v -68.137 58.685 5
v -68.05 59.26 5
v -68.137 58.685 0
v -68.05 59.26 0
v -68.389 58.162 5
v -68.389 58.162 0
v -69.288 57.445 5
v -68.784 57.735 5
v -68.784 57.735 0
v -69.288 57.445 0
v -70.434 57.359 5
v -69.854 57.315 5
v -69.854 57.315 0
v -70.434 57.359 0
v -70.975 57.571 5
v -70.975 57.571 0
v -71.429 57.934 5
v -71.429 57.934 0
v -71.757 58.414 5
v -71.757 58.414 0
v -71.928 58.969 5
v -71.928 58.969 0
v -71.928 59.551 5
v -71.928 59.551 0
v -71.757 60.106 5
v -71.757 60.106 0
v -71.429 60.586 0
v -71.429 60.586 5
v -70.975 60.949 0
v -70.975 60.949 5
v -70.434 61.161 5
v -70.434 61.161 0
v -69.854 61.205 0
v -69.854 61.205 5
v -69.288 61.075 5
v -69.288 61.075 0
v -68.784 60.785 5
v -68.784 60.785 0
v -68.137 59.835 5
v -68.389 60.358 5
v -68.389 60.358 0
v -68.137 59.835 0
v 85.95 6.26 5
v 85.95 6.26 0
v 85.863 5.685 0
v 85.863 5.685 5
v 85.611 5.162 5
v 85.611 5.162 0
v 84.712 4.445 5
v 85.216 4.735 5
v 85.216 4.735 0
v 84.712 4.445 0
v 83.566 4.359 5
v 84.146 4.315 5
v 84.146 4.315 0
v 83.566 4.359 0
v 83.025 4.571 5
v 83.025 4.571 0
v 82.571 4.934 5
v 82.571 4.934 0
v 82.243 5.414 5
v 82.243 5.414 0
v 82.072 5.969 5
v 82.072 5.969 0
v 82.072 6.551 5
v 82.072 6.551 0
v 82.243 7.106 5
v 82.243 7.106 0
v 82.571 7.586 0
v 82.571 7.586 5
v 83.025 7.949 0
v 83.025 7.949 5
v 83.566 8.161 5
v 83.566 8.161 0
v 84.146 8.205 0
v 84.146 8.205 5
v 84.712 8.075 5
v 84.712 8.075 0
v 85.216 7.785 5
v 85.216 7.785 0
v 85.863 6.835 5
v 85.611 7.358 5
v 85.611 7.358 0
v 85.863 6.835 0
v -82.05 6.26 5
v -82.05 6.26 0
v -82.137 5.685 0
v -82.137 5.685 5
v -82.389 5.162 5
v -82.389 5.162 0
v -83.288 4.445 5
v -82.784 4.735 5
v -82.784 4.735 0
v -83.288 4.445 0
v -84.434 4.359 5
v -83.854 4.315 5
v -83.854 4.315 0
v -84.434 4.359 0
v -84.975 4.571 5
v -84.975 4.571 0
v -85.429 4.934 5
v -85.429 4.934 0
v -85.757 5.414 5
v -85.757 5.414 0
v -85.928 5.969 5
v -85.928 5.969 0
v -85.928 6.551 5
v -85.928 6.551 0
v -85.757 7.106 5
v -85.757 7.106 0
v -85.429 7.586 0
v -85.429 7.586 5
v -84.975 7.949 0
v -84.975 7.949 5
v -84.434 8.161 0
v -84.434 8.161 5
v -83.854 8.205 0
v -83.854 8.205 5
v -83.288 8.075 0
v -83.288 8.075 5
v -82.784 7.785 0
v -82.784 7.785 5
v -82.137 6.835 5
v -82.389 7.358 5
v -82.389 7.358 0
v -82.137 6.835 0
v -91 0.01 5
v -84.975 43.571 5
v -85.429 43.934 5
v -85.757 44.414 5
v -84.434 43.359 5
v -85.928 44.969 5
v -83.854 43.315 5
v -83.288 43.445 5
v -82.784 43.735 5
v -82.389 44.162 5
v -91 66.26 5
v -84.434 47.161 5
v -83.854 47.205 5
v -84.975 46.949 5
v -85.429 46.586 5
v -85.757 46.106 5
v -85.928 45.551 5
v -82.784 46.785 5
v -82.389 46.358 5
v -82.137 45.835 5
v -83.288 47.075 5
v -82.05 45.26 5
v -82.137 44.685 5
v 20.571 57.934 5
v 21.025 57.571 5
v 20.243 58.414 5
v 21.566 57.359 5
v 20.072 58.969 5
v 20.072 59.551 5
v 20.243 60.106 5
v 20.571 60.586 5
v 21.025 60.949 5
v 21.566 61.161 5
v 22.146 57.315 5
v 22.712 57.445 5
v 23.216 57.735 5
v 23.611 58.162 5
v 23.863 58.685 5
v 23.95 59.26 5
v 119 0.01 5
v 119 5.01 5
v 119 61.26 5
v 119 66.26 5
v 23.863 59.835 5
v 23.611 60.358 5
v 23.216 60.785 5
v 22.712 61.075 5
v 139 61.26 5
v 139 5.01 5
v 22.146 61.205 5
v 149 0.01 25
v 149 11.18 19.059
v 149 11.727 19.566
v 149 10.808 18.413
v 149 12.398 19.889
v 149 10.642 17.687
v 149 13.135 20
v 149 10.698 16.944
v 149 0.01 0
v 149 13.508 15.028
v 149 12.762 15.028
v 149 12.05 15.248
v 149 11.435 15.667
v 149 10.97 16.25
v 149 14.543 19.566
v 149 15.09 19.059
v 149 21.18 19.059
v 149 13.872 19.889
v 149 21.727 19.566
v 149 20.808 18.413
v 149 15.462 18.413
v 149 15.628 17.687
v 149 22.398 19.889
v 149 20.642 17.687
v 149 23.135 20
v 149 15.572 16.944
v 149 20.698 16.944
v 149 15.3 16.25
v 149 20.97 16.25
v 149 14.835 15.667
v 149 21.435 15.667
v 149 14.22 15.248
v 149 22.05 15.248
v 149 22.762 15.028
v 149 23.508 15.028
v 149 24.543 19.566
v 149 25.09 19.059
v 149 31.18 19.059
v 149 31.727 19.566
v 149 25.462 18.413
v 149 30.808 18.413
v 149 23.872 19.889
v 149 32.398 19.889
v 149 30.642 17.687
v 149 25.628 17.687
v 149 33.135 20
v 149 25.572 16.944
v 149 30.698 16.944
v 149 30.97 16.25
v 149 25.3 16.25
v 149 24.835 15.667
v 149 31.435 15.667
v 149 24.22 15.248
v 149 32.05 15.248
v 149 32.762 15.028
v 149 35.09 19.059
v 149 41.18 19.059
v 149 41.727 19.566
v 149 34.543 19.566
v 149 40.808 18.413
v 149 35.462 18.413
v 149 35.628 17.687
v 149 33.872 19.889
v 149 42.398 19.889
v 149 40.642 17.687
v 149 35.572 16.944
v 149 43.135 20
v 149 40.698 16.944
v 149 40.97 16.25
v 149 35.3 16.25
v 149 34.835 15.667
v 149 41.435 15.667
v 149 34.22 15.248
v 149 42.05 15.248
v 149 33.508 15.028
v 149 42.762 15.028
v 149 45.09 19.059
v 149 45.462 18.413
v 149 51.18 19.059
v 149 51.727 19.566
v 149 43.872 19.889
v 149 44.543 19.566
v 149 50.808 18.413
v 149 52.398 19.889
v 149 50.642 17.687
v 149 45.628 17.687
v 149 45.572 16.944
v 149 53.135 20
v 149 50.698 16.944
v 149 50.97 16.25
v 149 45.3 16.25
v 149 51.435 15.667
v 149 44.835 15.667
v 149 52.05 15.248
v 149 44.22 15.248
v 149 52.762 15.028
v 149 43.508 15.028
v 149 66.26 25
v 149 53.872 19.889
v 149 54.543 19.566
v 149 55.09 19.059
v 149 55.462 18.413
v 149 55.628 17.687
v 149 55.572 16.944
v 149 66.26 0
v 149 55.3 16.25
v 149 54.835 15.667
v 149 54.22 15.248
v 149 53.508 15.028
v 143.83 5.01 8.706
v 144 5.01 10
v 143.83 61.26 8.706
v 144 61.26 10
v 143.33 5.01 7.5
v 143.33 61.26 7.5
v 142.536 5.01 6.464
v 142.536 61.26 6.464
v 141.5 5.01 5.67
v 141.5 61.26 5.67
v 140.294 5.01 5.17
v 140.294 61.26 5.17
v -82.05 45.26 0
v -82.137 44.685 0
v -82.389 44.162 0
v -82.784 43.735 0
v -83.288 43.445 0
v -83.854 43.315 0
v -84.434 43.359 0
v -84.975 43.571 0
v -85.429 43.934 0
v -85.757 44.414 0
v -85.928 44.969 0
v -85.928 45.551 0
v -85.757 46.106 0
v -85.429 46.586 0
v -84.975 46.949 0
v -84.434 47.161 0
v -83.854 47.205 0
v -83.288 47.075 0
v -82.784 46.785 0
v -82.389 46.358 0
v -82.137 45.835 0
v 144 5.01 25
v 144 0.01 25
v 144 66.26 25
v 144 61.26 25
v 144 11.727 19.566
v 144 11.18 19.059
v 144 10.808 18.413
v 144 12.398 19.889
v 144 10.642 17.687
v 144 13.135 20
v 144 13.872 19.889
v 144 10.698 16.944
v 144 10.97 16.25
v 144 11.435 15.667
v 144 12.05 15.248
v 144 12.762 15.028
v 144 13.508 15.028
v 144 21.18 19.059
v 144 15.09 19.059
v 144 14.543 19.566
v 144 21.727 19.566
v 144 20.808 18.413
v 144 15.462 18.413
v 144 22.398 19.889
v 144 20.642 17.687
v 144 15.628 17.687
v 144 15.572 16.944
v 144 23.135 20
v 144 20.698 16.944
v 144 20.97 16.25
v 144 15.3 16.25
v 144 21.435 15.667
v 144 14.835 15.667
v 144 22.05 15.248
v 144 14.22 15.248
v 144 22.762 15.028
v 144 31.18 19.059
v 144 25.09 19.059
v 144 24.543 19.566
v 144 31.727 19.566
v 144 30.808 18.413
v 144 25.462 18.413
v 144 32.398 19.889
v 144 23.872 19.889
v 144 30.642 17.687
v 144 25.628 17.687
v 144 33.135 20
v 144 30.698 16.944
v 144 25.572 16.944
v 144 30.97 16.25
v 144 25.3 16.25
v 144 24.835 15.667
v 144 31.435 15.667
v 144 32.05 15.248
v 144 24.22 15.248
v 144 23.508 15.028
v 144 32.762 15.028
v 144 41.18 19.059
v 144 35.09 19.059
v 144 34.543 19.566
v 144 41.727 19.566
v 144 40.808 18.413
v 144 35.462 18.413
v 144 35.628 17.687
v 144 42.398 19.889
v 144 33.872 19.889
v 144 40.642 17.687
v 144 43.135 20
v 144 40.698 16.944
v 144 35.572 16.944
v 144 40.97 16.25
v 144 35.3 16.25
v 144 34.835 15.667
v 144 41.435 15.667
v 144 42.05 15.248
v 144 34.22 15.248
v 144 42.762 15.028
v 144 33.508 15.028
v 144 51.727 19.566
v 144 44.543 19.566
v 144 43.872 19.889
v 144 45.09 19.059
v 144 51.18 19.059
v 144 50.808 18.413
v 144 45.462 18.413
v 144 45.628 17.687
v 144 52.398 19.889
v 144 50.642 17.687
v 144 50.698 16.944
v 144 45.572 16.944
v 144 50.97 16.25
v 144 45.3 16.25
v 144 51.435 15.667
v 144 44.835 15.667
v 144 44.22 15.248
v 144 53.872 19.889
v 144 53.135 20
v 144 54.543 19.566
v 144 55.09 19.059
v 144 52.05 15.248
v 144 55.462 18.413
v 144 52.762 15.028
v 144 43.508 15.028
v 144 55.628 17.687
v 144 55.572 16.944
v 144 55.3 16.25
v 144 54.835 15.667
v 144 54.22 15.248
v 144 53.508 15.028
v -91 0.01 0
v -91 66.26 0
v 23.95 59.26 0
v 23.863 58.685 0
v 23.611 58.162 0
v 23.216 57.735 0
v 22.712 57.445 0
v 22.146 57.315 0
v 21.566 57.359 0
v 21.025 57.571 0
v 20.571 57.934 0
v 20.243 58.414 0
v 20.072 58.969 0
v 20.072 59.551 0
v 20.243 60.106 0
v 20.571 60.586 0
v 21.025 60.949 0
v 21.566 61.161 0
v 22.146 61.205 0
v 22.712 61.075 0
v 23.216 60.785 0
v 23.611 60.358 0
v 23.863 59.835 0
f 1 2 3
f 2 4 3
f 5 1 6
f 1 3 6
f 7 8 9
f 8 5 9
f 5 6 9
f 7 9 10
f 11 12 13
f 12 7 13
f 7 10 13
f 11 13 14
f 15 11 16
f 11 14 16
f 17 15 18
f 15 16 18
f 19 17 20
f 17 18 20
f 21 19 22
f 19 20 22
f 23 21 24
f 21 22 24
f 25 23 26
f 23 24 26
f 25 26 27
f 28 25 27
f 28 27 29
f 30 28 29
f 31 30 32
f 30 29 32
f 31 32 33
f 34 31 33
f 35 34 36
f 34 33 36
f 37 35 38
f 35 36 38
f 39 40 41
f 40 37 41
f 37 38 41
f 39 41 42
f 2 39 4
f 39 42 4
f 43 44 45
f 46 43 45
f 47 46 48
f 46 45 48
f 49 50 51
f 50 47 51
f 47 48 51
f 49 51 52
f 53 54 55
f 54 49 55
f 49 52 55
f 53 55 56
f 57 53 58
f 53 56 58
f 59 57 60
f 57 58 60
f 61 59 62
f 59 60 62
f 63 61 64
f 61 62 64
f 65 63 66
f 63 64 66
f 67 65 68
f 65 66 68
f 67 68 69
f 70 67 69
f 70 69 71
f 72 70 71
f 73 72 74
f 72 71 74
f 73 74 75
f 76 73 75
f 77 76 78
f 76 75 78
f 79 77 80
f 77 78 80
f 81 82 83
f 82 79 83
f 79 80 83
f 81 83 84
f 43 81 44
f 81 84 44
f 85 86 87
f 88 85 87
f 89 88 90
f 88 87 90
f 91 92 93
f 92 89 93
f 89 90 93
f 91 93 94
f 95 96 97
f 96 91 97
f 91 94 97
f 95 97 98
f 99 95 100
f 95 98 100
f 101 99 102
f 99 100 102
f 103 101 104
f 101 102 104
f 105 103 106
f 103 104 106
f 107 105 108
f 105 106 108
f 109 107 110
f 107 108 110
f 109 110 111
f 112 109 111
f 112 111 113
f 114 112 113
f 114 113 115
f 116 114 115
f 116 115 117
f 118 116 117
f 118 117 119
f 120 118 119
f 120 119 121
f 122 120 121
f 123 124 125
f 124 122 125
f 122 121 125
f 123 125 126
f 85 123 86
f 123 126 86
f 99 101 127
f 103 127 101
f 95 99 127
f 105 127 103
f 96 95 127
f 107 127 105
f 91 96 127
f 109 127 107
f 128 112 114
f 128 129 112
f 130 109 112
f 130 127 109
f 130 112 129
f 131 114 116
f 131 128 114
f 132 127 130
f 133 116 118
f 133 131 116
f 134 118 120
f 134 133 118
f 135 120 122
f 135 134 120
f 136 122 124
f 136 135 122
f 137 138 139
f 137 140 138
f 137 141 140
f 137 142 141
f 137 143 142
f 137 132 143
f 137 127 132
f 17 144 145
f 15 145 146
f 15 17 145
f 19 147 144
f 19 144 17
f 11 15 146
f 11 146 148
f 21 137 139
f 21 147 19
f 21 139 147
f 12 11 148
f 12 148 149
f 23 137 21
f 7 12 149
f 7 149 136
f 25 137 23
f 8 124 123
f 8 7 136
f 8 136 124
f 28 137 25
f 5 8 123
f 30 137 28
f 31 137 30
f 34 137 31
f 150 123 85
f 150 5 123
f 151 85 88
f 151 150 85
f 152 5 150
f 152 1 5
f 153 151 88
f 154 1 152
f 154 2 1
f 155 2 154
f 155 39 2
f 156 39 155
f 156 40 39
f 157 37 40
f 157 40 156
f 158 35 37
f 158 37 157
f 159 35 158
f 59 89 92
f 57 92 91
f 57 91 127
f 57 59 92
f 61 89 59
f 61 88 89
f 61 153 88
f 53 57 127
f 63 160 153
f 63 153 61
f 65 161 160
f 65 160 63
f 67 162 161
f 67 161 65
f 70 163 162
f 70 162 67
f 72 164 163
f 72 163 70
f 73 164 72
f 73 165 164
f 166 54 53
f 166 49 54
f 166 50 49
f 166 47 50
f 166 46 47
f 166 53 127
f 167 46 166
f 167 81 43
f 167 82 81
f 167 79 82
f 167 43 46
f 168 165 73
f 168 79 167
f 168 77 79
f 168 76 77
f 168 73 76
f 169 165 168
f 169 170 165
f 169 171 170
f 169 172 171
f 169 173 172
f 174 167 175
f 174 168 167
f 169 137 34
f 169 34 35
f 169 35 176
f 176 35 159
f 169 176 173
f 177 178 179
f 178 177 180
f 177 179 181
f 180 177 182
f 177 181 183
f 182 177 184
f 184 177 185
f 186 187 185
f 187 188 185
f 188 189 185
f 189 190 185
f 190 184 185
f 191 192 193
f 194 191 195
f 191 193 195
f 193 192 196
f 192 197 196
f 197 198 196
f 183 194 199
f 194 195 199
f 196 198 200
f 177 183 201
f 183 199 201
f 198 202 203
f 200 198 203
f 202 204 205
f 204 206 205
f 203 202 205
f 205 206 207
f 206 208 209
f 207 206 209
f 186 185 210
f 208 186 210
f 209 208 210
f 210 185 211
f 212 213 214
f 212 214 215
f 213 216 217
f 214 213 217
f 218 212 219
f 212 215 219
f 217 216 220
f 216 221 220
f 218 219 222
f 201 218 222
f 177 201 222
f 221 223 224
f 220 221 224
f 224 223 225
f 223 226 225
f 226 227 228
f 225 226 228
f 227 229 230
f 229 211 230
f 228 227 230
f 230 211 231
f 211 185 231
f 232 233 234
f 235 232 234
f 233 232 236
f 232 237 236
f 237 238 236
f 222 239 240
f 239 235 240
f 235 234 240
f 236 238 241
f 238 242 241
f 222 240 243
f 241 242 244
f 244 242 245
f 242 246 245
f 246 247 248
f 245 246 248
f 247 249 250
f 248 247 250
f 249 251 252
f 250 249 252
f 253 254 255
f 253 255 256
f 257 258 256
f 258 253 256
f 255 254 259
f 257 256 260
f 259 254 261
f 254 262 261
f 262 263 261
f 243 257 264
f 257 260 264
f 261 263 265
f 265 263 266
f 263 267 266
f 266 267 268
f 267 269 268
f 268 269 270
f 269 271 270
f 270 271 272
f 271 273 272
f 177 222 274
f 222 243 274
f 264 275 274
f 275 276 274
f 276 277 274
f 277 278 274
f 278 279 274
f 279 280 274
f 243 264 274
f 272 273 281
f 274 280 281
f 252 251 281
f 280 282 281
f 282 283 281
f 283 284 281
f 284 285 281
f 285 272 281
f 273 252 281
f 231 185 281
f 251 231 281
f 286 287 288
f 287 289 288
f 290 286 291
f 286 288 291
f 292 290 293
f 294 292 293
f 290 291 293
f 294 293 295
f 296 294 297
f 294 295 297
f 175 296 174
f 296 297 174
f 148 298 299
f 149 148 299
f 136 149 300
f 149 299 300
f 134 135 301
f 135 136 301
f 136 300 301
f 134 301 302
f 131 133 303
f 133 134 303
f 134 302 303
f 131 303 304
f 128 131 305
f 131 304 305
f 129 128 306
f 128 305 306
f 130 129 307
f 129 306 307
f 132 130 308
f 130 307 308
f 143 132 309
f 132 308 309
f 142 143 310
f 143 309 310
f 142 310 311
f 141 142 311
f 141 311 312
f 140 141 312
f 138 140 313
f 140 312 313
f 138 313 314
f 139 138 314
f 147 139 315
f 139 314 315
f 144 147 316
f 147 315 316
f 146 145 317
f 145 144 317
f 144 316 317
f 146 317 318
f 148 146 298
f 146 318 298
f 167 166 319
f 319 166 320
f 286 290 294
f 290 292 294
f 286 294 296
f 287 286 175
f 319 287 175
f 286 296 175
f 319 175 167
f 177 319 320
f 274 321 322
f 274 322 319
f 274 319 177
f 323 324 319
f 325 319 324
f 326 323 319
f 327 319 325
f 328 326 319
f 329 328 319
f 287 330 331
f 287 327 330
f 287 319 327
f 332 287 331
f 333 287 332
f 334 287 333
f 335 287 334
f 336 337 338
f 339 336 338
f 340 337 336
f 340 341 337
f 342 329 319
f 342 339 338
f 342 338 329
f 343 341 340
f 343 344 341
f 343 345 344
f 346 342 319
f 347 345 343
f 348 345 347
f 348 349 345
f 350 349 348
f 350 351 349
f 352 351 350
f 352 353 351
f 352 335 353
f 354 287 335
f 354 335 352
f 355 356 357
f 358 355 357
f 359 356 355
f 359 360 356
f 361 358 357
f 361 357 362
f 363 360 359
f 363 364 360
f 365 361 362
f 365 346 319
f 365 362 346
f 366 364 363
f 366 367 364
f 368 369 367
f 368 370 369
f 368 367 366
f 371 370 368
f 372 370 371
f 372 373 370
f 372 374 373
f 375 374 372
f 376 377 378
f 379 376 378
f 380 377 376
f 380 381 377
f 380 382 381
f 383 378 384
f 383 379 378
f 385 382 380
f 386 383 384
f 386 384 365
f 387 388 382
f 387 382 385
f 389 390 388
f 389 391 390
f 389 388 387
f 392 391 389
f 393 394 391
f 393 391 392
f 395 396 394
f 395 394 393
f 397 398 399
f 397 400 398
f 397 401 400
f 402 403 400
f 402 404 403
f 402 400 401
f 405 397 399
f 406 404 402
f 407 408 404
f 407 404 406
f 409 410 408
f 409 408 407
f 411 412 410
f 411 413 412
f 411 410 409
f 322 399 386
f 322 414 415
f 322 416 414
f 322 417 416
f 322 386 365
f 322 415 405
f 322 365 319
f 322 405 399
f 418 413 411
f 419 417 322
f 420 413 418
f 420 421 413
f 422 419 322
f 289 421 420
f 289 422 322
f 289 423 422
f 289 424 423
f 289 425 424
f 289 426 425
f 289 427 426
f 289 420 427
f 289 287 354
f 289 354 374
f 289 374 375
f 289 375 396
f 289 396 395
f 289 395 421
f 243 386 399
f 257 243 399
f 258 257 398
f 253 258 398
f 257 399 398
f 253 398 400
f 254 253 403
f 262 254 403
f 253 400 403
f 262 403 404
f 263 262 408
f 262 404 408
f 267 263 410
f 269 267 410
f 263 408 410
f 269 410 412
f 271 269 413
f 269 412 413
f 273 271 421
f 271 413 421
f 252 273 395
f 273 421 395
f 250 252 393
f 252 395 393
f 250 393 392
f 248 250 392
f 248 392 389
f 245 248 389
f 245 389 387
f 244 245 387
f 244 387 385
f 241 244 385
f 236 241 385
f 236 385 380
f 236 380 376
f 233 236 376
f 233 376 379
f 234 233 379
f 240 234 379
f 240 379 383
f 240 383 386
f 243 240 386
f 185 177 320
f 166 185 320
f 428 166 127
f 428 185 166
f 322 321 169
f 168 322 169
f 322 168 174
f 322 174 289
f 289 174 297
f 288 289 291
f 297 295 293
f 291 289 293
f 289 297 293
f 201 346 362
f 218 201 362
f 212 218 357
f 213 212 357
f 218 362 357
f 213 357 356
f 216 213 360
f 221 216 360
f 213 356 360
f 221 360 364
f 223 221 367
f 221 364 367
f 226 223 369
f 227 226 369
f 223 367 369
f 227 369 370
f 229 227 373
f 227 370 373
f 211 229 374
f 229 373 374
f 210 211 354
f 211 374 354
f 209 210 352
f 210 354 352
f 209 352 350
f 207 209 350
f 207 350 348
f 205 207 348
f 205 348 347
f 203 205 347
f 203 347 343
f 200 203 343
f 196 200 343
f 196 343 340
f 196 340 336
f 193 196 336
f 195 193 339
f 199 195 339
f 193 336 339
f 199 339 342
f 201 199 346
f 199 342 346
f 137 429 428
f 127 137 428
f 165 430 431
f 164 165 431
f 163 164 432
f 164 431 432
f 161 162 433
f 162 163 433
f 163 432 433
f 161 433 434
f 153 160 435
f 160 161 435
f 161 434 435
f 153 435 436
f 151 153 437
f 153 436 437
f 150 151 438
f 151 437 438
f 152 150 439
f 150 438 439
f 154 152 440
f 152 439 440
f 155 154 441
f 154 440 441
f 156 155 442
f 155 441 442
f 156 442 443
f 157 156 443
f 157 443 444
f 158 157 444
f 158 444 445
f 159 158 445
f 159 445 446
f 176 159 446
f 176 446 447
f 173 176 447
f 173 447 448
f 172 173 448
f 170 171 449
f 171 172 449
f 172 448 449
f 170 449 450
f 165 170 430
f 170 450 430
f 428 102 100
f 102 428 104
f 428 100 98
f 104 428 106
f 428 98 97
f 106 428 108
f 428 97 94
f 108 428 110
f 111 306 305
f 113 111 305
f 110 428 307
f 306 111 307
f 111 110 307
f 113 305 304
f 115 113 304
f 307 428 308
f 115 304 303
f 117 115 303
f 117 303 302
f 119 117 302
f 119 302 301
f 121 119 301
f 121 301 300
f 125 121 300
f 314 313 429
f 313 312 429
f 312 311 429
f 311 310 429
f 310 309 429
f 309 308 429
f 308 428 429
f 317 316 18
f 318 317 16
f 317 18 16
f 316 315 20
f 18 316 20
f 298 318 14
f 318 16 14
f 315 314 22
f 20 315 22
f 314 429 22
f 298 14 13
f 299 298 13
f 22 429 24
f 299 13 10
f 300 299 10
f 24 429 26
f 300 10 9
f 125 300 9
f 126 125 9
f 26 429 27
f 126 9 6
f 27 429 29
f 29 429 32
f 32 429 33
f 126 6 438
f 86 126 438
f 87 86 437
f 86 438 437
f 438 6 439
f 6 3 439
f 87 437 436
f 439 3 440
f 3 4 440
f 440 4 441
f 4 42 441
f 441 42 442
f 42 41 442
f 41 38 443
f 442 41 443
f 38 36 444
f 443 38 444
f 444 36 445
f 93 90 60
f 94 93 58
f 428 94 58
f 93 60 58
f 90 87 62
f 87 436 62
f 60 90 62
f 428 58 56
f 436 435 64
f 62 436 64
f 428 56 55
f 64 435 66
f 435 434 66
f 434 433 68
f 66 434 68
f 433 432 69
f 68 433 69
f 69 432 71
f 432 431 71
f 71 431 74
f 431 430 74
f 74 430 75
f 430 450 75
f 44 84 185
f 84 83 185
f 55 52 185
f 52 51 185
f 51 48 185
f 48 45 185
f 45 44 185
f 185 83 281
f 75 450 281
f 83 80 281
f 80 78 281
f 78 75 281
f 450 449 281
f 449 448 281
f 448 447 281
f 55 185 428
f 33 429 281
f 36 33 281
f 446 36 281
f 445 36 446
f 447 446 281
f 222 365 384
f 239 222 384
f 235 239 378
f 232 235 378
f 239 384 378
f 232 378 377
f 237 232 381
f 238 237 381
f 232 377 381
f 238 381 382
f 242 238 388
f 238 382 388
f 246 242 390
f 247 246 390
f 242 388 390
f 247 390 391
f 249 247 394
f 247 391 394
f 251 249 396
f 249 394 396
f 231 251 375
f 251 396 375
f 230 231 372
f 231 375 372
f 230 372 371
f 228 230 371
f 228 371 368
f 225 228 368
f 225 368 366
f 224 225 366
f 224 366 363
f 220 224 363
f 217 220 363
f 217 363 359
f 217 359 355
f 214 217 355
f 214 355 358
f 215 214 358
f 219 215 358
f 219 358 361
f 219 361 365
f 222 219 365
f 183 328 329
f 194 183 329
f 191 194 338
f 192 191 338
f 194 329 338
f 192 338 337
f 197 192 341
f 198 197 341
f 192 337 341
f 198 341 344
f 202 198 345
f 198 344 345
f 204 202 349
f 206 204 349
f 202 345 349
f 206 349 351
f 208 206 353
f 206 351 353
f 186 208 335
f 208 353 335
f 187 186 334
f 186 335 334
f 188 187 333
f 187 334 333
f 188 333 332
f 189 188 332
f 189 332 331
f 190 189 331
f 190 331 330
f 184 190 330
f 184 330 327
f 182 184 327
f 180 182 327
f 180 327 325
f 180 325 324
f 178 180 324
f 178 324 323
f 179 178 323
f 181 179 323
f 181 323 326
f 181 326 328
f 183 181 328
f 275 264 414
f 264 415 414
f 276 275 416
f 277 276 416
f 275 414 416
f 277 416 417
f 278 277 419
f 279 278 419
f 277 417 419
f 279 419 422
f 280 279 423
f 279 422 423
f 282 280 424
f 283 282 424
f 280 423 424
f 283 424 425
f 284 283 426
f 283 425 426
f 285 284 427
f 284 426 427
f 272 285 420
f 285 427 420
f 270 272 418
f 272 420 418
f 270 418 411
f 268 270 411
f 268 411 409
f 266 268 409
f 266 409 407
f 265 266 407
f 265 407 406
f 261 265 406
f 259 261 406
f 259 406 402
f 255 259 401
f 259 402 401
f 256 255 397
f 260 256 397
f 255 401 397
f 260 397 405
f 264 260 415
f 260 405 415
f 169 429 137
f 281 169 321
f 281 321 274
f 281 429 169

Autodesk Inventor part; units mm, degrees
ref_plane "YZ Plane" through (0, 0, 0) normal (1, 0, 0) x (0, 1, 0)
ref_plane "XZ Plane" through (0, 0, 0) normal (0, 1, 0) x (-1, 0, 0)
ref_plane "XY Plane" through (0, 0, 0) normal (0, 0, 1) x (1, 0, 0)
ref_plane "Work Plane1" through (0, 0, 0) normal (0, 0, 1) x (1, 0, 0)
sketch "Sketch1" plane through (0, 0, 0) normal (0, 0, 1) x (1, 0, 0)
  line L0 (91, 0.01) -> (-91, 0.01) construction
  line L1 (91, 0.01) -> (91, 13.01) construction
  line L2 (28.25, 66.26) -> (91, 13.01) construction
  line L3 (-75.75, 66.26) -> (28.25, 66.26) construction
  line L4 (-91, 51.01) -> (-75.75, 66.26) construction
  line L5 (-91, 0.01) -> (-91, 51.01) construction
  circle A0 centre (22, 59.26) radius 1.95 projected
  circle A1 centre (-84, 6.26) radius 1.95 projected
  circle A2 centre (-84, 45.26) radius 1.95 projected
  circle A3 centre (-70, 59.26) radius 1.95 projected
  line L6 (149.1, -0.3275) -> (149.1, 180.6725) construction
  line L7 (-91, 0.01) -> (149, 0.01)
  line L8 (149, 0.01) -> (149, 66.26)
  line L9 (149, 66.26) -> (-91, 66.26)
  line L10 (-91, 66.26) -> (-91, 0.01)
  circle A4 centre (84, 6.26) radius 1.95 projected
  point P0 (0, 0)
  dimension "d0" = 0.1
extrude "Extrusion1" add sketch "Sketch1" along normal blind 5
sketch "Sketch2" plane through (0, 0, 5) normal (0, 0, 1) x (1, 0, 0)
  line L0 (149, 0.01) -> (149, 66.26) projected
  line L1 (149, 66.26) -> (-91, 66.26) projected
  line L2 (149, 0.01) -> (144, 0.01)
  line L3 (144, 0.01) -> (144, 66.26)
  line L4 (144, 66.26) -> (149, 66.26)
  line L5 (149, 66.26) -> (149, 0.01)
  point P0 (0, 0)
  dimension "d3" = 5
extrude "Extrusion2" add sketch "Sketch2" along normal blind 20
fillet "Fillet1" radius 5 1 edges at (144, 33.135, 5)
sketch "Sketch3" plane through (-91, 66.26, 0) normal (0, 1, 0) x (1, 0, 0)
  line L0 (240, -25) -> (235, -25) projected
  line L1 (235, -25) -> (210, -5)
  line L2 (230, -5) -> (0, -5) projected
  line L3 (235, -10) -> (235, -25) projected
  arc A0 (235, -10) -> (230, -5) centre (230, -10) ccw projected
  point P0 (91, 0)
  dimension "d7" = 20
extrude "Extrusion3" add sketch "Sketch3" against normal blind 5
ref_plane "Work Plane2" through (-91, 33.135, 0) normal (0, -1, 0) x (1, 0, 0)
mirror "Mirror1" about plane through (-91, 33.135, 0) normal (0, -1, 0) of "Extrusion3"
sketch "Sketch4" plane through (144, 61.26, 10) normal (-1, 0, 0) x (0, 0, 1)
  line L0 (0, -56.25) -> (15, -56.25) projected
  line L1 (15, 0) -> (15, -56.25) projected
  line L2 (15, 0) -> (0, 0) projected
  line L3 (0, -56.25) -> (0, 0) projected
  circle A0 centre (7.5, -18.125) radius 2.5
  circle A1 centre (7.5, -38.125) radius 2.5
  circle A2 centre (7.5, -28.125) radius 2.5
  line L4 (0, -56.25) -> (0, 0) projected
  line L5 (0, -28.125) -> (15, -28.125) construction
  line L6 (15, -61.25) -> (15, 5) projected
  circle A3 centre (7.5, -8.125) radius 2.5
  circle A4 centre (7.5, -48.125) radius 2.5
  point P0 (-10, -61.26)
  point P1 (7.5, -28.125)
  dimension "d10" = 5
  dimension "d11" = 5
  dimension "d12" = 10
  dimension "d13" = 5
  dimension "d14" = 10
extrude "Extrusion4" cut sketch "Sketch4" against normal through all contours A0 | A1 | A2 | A3 | A4
properties part number "dilution system bracket"
